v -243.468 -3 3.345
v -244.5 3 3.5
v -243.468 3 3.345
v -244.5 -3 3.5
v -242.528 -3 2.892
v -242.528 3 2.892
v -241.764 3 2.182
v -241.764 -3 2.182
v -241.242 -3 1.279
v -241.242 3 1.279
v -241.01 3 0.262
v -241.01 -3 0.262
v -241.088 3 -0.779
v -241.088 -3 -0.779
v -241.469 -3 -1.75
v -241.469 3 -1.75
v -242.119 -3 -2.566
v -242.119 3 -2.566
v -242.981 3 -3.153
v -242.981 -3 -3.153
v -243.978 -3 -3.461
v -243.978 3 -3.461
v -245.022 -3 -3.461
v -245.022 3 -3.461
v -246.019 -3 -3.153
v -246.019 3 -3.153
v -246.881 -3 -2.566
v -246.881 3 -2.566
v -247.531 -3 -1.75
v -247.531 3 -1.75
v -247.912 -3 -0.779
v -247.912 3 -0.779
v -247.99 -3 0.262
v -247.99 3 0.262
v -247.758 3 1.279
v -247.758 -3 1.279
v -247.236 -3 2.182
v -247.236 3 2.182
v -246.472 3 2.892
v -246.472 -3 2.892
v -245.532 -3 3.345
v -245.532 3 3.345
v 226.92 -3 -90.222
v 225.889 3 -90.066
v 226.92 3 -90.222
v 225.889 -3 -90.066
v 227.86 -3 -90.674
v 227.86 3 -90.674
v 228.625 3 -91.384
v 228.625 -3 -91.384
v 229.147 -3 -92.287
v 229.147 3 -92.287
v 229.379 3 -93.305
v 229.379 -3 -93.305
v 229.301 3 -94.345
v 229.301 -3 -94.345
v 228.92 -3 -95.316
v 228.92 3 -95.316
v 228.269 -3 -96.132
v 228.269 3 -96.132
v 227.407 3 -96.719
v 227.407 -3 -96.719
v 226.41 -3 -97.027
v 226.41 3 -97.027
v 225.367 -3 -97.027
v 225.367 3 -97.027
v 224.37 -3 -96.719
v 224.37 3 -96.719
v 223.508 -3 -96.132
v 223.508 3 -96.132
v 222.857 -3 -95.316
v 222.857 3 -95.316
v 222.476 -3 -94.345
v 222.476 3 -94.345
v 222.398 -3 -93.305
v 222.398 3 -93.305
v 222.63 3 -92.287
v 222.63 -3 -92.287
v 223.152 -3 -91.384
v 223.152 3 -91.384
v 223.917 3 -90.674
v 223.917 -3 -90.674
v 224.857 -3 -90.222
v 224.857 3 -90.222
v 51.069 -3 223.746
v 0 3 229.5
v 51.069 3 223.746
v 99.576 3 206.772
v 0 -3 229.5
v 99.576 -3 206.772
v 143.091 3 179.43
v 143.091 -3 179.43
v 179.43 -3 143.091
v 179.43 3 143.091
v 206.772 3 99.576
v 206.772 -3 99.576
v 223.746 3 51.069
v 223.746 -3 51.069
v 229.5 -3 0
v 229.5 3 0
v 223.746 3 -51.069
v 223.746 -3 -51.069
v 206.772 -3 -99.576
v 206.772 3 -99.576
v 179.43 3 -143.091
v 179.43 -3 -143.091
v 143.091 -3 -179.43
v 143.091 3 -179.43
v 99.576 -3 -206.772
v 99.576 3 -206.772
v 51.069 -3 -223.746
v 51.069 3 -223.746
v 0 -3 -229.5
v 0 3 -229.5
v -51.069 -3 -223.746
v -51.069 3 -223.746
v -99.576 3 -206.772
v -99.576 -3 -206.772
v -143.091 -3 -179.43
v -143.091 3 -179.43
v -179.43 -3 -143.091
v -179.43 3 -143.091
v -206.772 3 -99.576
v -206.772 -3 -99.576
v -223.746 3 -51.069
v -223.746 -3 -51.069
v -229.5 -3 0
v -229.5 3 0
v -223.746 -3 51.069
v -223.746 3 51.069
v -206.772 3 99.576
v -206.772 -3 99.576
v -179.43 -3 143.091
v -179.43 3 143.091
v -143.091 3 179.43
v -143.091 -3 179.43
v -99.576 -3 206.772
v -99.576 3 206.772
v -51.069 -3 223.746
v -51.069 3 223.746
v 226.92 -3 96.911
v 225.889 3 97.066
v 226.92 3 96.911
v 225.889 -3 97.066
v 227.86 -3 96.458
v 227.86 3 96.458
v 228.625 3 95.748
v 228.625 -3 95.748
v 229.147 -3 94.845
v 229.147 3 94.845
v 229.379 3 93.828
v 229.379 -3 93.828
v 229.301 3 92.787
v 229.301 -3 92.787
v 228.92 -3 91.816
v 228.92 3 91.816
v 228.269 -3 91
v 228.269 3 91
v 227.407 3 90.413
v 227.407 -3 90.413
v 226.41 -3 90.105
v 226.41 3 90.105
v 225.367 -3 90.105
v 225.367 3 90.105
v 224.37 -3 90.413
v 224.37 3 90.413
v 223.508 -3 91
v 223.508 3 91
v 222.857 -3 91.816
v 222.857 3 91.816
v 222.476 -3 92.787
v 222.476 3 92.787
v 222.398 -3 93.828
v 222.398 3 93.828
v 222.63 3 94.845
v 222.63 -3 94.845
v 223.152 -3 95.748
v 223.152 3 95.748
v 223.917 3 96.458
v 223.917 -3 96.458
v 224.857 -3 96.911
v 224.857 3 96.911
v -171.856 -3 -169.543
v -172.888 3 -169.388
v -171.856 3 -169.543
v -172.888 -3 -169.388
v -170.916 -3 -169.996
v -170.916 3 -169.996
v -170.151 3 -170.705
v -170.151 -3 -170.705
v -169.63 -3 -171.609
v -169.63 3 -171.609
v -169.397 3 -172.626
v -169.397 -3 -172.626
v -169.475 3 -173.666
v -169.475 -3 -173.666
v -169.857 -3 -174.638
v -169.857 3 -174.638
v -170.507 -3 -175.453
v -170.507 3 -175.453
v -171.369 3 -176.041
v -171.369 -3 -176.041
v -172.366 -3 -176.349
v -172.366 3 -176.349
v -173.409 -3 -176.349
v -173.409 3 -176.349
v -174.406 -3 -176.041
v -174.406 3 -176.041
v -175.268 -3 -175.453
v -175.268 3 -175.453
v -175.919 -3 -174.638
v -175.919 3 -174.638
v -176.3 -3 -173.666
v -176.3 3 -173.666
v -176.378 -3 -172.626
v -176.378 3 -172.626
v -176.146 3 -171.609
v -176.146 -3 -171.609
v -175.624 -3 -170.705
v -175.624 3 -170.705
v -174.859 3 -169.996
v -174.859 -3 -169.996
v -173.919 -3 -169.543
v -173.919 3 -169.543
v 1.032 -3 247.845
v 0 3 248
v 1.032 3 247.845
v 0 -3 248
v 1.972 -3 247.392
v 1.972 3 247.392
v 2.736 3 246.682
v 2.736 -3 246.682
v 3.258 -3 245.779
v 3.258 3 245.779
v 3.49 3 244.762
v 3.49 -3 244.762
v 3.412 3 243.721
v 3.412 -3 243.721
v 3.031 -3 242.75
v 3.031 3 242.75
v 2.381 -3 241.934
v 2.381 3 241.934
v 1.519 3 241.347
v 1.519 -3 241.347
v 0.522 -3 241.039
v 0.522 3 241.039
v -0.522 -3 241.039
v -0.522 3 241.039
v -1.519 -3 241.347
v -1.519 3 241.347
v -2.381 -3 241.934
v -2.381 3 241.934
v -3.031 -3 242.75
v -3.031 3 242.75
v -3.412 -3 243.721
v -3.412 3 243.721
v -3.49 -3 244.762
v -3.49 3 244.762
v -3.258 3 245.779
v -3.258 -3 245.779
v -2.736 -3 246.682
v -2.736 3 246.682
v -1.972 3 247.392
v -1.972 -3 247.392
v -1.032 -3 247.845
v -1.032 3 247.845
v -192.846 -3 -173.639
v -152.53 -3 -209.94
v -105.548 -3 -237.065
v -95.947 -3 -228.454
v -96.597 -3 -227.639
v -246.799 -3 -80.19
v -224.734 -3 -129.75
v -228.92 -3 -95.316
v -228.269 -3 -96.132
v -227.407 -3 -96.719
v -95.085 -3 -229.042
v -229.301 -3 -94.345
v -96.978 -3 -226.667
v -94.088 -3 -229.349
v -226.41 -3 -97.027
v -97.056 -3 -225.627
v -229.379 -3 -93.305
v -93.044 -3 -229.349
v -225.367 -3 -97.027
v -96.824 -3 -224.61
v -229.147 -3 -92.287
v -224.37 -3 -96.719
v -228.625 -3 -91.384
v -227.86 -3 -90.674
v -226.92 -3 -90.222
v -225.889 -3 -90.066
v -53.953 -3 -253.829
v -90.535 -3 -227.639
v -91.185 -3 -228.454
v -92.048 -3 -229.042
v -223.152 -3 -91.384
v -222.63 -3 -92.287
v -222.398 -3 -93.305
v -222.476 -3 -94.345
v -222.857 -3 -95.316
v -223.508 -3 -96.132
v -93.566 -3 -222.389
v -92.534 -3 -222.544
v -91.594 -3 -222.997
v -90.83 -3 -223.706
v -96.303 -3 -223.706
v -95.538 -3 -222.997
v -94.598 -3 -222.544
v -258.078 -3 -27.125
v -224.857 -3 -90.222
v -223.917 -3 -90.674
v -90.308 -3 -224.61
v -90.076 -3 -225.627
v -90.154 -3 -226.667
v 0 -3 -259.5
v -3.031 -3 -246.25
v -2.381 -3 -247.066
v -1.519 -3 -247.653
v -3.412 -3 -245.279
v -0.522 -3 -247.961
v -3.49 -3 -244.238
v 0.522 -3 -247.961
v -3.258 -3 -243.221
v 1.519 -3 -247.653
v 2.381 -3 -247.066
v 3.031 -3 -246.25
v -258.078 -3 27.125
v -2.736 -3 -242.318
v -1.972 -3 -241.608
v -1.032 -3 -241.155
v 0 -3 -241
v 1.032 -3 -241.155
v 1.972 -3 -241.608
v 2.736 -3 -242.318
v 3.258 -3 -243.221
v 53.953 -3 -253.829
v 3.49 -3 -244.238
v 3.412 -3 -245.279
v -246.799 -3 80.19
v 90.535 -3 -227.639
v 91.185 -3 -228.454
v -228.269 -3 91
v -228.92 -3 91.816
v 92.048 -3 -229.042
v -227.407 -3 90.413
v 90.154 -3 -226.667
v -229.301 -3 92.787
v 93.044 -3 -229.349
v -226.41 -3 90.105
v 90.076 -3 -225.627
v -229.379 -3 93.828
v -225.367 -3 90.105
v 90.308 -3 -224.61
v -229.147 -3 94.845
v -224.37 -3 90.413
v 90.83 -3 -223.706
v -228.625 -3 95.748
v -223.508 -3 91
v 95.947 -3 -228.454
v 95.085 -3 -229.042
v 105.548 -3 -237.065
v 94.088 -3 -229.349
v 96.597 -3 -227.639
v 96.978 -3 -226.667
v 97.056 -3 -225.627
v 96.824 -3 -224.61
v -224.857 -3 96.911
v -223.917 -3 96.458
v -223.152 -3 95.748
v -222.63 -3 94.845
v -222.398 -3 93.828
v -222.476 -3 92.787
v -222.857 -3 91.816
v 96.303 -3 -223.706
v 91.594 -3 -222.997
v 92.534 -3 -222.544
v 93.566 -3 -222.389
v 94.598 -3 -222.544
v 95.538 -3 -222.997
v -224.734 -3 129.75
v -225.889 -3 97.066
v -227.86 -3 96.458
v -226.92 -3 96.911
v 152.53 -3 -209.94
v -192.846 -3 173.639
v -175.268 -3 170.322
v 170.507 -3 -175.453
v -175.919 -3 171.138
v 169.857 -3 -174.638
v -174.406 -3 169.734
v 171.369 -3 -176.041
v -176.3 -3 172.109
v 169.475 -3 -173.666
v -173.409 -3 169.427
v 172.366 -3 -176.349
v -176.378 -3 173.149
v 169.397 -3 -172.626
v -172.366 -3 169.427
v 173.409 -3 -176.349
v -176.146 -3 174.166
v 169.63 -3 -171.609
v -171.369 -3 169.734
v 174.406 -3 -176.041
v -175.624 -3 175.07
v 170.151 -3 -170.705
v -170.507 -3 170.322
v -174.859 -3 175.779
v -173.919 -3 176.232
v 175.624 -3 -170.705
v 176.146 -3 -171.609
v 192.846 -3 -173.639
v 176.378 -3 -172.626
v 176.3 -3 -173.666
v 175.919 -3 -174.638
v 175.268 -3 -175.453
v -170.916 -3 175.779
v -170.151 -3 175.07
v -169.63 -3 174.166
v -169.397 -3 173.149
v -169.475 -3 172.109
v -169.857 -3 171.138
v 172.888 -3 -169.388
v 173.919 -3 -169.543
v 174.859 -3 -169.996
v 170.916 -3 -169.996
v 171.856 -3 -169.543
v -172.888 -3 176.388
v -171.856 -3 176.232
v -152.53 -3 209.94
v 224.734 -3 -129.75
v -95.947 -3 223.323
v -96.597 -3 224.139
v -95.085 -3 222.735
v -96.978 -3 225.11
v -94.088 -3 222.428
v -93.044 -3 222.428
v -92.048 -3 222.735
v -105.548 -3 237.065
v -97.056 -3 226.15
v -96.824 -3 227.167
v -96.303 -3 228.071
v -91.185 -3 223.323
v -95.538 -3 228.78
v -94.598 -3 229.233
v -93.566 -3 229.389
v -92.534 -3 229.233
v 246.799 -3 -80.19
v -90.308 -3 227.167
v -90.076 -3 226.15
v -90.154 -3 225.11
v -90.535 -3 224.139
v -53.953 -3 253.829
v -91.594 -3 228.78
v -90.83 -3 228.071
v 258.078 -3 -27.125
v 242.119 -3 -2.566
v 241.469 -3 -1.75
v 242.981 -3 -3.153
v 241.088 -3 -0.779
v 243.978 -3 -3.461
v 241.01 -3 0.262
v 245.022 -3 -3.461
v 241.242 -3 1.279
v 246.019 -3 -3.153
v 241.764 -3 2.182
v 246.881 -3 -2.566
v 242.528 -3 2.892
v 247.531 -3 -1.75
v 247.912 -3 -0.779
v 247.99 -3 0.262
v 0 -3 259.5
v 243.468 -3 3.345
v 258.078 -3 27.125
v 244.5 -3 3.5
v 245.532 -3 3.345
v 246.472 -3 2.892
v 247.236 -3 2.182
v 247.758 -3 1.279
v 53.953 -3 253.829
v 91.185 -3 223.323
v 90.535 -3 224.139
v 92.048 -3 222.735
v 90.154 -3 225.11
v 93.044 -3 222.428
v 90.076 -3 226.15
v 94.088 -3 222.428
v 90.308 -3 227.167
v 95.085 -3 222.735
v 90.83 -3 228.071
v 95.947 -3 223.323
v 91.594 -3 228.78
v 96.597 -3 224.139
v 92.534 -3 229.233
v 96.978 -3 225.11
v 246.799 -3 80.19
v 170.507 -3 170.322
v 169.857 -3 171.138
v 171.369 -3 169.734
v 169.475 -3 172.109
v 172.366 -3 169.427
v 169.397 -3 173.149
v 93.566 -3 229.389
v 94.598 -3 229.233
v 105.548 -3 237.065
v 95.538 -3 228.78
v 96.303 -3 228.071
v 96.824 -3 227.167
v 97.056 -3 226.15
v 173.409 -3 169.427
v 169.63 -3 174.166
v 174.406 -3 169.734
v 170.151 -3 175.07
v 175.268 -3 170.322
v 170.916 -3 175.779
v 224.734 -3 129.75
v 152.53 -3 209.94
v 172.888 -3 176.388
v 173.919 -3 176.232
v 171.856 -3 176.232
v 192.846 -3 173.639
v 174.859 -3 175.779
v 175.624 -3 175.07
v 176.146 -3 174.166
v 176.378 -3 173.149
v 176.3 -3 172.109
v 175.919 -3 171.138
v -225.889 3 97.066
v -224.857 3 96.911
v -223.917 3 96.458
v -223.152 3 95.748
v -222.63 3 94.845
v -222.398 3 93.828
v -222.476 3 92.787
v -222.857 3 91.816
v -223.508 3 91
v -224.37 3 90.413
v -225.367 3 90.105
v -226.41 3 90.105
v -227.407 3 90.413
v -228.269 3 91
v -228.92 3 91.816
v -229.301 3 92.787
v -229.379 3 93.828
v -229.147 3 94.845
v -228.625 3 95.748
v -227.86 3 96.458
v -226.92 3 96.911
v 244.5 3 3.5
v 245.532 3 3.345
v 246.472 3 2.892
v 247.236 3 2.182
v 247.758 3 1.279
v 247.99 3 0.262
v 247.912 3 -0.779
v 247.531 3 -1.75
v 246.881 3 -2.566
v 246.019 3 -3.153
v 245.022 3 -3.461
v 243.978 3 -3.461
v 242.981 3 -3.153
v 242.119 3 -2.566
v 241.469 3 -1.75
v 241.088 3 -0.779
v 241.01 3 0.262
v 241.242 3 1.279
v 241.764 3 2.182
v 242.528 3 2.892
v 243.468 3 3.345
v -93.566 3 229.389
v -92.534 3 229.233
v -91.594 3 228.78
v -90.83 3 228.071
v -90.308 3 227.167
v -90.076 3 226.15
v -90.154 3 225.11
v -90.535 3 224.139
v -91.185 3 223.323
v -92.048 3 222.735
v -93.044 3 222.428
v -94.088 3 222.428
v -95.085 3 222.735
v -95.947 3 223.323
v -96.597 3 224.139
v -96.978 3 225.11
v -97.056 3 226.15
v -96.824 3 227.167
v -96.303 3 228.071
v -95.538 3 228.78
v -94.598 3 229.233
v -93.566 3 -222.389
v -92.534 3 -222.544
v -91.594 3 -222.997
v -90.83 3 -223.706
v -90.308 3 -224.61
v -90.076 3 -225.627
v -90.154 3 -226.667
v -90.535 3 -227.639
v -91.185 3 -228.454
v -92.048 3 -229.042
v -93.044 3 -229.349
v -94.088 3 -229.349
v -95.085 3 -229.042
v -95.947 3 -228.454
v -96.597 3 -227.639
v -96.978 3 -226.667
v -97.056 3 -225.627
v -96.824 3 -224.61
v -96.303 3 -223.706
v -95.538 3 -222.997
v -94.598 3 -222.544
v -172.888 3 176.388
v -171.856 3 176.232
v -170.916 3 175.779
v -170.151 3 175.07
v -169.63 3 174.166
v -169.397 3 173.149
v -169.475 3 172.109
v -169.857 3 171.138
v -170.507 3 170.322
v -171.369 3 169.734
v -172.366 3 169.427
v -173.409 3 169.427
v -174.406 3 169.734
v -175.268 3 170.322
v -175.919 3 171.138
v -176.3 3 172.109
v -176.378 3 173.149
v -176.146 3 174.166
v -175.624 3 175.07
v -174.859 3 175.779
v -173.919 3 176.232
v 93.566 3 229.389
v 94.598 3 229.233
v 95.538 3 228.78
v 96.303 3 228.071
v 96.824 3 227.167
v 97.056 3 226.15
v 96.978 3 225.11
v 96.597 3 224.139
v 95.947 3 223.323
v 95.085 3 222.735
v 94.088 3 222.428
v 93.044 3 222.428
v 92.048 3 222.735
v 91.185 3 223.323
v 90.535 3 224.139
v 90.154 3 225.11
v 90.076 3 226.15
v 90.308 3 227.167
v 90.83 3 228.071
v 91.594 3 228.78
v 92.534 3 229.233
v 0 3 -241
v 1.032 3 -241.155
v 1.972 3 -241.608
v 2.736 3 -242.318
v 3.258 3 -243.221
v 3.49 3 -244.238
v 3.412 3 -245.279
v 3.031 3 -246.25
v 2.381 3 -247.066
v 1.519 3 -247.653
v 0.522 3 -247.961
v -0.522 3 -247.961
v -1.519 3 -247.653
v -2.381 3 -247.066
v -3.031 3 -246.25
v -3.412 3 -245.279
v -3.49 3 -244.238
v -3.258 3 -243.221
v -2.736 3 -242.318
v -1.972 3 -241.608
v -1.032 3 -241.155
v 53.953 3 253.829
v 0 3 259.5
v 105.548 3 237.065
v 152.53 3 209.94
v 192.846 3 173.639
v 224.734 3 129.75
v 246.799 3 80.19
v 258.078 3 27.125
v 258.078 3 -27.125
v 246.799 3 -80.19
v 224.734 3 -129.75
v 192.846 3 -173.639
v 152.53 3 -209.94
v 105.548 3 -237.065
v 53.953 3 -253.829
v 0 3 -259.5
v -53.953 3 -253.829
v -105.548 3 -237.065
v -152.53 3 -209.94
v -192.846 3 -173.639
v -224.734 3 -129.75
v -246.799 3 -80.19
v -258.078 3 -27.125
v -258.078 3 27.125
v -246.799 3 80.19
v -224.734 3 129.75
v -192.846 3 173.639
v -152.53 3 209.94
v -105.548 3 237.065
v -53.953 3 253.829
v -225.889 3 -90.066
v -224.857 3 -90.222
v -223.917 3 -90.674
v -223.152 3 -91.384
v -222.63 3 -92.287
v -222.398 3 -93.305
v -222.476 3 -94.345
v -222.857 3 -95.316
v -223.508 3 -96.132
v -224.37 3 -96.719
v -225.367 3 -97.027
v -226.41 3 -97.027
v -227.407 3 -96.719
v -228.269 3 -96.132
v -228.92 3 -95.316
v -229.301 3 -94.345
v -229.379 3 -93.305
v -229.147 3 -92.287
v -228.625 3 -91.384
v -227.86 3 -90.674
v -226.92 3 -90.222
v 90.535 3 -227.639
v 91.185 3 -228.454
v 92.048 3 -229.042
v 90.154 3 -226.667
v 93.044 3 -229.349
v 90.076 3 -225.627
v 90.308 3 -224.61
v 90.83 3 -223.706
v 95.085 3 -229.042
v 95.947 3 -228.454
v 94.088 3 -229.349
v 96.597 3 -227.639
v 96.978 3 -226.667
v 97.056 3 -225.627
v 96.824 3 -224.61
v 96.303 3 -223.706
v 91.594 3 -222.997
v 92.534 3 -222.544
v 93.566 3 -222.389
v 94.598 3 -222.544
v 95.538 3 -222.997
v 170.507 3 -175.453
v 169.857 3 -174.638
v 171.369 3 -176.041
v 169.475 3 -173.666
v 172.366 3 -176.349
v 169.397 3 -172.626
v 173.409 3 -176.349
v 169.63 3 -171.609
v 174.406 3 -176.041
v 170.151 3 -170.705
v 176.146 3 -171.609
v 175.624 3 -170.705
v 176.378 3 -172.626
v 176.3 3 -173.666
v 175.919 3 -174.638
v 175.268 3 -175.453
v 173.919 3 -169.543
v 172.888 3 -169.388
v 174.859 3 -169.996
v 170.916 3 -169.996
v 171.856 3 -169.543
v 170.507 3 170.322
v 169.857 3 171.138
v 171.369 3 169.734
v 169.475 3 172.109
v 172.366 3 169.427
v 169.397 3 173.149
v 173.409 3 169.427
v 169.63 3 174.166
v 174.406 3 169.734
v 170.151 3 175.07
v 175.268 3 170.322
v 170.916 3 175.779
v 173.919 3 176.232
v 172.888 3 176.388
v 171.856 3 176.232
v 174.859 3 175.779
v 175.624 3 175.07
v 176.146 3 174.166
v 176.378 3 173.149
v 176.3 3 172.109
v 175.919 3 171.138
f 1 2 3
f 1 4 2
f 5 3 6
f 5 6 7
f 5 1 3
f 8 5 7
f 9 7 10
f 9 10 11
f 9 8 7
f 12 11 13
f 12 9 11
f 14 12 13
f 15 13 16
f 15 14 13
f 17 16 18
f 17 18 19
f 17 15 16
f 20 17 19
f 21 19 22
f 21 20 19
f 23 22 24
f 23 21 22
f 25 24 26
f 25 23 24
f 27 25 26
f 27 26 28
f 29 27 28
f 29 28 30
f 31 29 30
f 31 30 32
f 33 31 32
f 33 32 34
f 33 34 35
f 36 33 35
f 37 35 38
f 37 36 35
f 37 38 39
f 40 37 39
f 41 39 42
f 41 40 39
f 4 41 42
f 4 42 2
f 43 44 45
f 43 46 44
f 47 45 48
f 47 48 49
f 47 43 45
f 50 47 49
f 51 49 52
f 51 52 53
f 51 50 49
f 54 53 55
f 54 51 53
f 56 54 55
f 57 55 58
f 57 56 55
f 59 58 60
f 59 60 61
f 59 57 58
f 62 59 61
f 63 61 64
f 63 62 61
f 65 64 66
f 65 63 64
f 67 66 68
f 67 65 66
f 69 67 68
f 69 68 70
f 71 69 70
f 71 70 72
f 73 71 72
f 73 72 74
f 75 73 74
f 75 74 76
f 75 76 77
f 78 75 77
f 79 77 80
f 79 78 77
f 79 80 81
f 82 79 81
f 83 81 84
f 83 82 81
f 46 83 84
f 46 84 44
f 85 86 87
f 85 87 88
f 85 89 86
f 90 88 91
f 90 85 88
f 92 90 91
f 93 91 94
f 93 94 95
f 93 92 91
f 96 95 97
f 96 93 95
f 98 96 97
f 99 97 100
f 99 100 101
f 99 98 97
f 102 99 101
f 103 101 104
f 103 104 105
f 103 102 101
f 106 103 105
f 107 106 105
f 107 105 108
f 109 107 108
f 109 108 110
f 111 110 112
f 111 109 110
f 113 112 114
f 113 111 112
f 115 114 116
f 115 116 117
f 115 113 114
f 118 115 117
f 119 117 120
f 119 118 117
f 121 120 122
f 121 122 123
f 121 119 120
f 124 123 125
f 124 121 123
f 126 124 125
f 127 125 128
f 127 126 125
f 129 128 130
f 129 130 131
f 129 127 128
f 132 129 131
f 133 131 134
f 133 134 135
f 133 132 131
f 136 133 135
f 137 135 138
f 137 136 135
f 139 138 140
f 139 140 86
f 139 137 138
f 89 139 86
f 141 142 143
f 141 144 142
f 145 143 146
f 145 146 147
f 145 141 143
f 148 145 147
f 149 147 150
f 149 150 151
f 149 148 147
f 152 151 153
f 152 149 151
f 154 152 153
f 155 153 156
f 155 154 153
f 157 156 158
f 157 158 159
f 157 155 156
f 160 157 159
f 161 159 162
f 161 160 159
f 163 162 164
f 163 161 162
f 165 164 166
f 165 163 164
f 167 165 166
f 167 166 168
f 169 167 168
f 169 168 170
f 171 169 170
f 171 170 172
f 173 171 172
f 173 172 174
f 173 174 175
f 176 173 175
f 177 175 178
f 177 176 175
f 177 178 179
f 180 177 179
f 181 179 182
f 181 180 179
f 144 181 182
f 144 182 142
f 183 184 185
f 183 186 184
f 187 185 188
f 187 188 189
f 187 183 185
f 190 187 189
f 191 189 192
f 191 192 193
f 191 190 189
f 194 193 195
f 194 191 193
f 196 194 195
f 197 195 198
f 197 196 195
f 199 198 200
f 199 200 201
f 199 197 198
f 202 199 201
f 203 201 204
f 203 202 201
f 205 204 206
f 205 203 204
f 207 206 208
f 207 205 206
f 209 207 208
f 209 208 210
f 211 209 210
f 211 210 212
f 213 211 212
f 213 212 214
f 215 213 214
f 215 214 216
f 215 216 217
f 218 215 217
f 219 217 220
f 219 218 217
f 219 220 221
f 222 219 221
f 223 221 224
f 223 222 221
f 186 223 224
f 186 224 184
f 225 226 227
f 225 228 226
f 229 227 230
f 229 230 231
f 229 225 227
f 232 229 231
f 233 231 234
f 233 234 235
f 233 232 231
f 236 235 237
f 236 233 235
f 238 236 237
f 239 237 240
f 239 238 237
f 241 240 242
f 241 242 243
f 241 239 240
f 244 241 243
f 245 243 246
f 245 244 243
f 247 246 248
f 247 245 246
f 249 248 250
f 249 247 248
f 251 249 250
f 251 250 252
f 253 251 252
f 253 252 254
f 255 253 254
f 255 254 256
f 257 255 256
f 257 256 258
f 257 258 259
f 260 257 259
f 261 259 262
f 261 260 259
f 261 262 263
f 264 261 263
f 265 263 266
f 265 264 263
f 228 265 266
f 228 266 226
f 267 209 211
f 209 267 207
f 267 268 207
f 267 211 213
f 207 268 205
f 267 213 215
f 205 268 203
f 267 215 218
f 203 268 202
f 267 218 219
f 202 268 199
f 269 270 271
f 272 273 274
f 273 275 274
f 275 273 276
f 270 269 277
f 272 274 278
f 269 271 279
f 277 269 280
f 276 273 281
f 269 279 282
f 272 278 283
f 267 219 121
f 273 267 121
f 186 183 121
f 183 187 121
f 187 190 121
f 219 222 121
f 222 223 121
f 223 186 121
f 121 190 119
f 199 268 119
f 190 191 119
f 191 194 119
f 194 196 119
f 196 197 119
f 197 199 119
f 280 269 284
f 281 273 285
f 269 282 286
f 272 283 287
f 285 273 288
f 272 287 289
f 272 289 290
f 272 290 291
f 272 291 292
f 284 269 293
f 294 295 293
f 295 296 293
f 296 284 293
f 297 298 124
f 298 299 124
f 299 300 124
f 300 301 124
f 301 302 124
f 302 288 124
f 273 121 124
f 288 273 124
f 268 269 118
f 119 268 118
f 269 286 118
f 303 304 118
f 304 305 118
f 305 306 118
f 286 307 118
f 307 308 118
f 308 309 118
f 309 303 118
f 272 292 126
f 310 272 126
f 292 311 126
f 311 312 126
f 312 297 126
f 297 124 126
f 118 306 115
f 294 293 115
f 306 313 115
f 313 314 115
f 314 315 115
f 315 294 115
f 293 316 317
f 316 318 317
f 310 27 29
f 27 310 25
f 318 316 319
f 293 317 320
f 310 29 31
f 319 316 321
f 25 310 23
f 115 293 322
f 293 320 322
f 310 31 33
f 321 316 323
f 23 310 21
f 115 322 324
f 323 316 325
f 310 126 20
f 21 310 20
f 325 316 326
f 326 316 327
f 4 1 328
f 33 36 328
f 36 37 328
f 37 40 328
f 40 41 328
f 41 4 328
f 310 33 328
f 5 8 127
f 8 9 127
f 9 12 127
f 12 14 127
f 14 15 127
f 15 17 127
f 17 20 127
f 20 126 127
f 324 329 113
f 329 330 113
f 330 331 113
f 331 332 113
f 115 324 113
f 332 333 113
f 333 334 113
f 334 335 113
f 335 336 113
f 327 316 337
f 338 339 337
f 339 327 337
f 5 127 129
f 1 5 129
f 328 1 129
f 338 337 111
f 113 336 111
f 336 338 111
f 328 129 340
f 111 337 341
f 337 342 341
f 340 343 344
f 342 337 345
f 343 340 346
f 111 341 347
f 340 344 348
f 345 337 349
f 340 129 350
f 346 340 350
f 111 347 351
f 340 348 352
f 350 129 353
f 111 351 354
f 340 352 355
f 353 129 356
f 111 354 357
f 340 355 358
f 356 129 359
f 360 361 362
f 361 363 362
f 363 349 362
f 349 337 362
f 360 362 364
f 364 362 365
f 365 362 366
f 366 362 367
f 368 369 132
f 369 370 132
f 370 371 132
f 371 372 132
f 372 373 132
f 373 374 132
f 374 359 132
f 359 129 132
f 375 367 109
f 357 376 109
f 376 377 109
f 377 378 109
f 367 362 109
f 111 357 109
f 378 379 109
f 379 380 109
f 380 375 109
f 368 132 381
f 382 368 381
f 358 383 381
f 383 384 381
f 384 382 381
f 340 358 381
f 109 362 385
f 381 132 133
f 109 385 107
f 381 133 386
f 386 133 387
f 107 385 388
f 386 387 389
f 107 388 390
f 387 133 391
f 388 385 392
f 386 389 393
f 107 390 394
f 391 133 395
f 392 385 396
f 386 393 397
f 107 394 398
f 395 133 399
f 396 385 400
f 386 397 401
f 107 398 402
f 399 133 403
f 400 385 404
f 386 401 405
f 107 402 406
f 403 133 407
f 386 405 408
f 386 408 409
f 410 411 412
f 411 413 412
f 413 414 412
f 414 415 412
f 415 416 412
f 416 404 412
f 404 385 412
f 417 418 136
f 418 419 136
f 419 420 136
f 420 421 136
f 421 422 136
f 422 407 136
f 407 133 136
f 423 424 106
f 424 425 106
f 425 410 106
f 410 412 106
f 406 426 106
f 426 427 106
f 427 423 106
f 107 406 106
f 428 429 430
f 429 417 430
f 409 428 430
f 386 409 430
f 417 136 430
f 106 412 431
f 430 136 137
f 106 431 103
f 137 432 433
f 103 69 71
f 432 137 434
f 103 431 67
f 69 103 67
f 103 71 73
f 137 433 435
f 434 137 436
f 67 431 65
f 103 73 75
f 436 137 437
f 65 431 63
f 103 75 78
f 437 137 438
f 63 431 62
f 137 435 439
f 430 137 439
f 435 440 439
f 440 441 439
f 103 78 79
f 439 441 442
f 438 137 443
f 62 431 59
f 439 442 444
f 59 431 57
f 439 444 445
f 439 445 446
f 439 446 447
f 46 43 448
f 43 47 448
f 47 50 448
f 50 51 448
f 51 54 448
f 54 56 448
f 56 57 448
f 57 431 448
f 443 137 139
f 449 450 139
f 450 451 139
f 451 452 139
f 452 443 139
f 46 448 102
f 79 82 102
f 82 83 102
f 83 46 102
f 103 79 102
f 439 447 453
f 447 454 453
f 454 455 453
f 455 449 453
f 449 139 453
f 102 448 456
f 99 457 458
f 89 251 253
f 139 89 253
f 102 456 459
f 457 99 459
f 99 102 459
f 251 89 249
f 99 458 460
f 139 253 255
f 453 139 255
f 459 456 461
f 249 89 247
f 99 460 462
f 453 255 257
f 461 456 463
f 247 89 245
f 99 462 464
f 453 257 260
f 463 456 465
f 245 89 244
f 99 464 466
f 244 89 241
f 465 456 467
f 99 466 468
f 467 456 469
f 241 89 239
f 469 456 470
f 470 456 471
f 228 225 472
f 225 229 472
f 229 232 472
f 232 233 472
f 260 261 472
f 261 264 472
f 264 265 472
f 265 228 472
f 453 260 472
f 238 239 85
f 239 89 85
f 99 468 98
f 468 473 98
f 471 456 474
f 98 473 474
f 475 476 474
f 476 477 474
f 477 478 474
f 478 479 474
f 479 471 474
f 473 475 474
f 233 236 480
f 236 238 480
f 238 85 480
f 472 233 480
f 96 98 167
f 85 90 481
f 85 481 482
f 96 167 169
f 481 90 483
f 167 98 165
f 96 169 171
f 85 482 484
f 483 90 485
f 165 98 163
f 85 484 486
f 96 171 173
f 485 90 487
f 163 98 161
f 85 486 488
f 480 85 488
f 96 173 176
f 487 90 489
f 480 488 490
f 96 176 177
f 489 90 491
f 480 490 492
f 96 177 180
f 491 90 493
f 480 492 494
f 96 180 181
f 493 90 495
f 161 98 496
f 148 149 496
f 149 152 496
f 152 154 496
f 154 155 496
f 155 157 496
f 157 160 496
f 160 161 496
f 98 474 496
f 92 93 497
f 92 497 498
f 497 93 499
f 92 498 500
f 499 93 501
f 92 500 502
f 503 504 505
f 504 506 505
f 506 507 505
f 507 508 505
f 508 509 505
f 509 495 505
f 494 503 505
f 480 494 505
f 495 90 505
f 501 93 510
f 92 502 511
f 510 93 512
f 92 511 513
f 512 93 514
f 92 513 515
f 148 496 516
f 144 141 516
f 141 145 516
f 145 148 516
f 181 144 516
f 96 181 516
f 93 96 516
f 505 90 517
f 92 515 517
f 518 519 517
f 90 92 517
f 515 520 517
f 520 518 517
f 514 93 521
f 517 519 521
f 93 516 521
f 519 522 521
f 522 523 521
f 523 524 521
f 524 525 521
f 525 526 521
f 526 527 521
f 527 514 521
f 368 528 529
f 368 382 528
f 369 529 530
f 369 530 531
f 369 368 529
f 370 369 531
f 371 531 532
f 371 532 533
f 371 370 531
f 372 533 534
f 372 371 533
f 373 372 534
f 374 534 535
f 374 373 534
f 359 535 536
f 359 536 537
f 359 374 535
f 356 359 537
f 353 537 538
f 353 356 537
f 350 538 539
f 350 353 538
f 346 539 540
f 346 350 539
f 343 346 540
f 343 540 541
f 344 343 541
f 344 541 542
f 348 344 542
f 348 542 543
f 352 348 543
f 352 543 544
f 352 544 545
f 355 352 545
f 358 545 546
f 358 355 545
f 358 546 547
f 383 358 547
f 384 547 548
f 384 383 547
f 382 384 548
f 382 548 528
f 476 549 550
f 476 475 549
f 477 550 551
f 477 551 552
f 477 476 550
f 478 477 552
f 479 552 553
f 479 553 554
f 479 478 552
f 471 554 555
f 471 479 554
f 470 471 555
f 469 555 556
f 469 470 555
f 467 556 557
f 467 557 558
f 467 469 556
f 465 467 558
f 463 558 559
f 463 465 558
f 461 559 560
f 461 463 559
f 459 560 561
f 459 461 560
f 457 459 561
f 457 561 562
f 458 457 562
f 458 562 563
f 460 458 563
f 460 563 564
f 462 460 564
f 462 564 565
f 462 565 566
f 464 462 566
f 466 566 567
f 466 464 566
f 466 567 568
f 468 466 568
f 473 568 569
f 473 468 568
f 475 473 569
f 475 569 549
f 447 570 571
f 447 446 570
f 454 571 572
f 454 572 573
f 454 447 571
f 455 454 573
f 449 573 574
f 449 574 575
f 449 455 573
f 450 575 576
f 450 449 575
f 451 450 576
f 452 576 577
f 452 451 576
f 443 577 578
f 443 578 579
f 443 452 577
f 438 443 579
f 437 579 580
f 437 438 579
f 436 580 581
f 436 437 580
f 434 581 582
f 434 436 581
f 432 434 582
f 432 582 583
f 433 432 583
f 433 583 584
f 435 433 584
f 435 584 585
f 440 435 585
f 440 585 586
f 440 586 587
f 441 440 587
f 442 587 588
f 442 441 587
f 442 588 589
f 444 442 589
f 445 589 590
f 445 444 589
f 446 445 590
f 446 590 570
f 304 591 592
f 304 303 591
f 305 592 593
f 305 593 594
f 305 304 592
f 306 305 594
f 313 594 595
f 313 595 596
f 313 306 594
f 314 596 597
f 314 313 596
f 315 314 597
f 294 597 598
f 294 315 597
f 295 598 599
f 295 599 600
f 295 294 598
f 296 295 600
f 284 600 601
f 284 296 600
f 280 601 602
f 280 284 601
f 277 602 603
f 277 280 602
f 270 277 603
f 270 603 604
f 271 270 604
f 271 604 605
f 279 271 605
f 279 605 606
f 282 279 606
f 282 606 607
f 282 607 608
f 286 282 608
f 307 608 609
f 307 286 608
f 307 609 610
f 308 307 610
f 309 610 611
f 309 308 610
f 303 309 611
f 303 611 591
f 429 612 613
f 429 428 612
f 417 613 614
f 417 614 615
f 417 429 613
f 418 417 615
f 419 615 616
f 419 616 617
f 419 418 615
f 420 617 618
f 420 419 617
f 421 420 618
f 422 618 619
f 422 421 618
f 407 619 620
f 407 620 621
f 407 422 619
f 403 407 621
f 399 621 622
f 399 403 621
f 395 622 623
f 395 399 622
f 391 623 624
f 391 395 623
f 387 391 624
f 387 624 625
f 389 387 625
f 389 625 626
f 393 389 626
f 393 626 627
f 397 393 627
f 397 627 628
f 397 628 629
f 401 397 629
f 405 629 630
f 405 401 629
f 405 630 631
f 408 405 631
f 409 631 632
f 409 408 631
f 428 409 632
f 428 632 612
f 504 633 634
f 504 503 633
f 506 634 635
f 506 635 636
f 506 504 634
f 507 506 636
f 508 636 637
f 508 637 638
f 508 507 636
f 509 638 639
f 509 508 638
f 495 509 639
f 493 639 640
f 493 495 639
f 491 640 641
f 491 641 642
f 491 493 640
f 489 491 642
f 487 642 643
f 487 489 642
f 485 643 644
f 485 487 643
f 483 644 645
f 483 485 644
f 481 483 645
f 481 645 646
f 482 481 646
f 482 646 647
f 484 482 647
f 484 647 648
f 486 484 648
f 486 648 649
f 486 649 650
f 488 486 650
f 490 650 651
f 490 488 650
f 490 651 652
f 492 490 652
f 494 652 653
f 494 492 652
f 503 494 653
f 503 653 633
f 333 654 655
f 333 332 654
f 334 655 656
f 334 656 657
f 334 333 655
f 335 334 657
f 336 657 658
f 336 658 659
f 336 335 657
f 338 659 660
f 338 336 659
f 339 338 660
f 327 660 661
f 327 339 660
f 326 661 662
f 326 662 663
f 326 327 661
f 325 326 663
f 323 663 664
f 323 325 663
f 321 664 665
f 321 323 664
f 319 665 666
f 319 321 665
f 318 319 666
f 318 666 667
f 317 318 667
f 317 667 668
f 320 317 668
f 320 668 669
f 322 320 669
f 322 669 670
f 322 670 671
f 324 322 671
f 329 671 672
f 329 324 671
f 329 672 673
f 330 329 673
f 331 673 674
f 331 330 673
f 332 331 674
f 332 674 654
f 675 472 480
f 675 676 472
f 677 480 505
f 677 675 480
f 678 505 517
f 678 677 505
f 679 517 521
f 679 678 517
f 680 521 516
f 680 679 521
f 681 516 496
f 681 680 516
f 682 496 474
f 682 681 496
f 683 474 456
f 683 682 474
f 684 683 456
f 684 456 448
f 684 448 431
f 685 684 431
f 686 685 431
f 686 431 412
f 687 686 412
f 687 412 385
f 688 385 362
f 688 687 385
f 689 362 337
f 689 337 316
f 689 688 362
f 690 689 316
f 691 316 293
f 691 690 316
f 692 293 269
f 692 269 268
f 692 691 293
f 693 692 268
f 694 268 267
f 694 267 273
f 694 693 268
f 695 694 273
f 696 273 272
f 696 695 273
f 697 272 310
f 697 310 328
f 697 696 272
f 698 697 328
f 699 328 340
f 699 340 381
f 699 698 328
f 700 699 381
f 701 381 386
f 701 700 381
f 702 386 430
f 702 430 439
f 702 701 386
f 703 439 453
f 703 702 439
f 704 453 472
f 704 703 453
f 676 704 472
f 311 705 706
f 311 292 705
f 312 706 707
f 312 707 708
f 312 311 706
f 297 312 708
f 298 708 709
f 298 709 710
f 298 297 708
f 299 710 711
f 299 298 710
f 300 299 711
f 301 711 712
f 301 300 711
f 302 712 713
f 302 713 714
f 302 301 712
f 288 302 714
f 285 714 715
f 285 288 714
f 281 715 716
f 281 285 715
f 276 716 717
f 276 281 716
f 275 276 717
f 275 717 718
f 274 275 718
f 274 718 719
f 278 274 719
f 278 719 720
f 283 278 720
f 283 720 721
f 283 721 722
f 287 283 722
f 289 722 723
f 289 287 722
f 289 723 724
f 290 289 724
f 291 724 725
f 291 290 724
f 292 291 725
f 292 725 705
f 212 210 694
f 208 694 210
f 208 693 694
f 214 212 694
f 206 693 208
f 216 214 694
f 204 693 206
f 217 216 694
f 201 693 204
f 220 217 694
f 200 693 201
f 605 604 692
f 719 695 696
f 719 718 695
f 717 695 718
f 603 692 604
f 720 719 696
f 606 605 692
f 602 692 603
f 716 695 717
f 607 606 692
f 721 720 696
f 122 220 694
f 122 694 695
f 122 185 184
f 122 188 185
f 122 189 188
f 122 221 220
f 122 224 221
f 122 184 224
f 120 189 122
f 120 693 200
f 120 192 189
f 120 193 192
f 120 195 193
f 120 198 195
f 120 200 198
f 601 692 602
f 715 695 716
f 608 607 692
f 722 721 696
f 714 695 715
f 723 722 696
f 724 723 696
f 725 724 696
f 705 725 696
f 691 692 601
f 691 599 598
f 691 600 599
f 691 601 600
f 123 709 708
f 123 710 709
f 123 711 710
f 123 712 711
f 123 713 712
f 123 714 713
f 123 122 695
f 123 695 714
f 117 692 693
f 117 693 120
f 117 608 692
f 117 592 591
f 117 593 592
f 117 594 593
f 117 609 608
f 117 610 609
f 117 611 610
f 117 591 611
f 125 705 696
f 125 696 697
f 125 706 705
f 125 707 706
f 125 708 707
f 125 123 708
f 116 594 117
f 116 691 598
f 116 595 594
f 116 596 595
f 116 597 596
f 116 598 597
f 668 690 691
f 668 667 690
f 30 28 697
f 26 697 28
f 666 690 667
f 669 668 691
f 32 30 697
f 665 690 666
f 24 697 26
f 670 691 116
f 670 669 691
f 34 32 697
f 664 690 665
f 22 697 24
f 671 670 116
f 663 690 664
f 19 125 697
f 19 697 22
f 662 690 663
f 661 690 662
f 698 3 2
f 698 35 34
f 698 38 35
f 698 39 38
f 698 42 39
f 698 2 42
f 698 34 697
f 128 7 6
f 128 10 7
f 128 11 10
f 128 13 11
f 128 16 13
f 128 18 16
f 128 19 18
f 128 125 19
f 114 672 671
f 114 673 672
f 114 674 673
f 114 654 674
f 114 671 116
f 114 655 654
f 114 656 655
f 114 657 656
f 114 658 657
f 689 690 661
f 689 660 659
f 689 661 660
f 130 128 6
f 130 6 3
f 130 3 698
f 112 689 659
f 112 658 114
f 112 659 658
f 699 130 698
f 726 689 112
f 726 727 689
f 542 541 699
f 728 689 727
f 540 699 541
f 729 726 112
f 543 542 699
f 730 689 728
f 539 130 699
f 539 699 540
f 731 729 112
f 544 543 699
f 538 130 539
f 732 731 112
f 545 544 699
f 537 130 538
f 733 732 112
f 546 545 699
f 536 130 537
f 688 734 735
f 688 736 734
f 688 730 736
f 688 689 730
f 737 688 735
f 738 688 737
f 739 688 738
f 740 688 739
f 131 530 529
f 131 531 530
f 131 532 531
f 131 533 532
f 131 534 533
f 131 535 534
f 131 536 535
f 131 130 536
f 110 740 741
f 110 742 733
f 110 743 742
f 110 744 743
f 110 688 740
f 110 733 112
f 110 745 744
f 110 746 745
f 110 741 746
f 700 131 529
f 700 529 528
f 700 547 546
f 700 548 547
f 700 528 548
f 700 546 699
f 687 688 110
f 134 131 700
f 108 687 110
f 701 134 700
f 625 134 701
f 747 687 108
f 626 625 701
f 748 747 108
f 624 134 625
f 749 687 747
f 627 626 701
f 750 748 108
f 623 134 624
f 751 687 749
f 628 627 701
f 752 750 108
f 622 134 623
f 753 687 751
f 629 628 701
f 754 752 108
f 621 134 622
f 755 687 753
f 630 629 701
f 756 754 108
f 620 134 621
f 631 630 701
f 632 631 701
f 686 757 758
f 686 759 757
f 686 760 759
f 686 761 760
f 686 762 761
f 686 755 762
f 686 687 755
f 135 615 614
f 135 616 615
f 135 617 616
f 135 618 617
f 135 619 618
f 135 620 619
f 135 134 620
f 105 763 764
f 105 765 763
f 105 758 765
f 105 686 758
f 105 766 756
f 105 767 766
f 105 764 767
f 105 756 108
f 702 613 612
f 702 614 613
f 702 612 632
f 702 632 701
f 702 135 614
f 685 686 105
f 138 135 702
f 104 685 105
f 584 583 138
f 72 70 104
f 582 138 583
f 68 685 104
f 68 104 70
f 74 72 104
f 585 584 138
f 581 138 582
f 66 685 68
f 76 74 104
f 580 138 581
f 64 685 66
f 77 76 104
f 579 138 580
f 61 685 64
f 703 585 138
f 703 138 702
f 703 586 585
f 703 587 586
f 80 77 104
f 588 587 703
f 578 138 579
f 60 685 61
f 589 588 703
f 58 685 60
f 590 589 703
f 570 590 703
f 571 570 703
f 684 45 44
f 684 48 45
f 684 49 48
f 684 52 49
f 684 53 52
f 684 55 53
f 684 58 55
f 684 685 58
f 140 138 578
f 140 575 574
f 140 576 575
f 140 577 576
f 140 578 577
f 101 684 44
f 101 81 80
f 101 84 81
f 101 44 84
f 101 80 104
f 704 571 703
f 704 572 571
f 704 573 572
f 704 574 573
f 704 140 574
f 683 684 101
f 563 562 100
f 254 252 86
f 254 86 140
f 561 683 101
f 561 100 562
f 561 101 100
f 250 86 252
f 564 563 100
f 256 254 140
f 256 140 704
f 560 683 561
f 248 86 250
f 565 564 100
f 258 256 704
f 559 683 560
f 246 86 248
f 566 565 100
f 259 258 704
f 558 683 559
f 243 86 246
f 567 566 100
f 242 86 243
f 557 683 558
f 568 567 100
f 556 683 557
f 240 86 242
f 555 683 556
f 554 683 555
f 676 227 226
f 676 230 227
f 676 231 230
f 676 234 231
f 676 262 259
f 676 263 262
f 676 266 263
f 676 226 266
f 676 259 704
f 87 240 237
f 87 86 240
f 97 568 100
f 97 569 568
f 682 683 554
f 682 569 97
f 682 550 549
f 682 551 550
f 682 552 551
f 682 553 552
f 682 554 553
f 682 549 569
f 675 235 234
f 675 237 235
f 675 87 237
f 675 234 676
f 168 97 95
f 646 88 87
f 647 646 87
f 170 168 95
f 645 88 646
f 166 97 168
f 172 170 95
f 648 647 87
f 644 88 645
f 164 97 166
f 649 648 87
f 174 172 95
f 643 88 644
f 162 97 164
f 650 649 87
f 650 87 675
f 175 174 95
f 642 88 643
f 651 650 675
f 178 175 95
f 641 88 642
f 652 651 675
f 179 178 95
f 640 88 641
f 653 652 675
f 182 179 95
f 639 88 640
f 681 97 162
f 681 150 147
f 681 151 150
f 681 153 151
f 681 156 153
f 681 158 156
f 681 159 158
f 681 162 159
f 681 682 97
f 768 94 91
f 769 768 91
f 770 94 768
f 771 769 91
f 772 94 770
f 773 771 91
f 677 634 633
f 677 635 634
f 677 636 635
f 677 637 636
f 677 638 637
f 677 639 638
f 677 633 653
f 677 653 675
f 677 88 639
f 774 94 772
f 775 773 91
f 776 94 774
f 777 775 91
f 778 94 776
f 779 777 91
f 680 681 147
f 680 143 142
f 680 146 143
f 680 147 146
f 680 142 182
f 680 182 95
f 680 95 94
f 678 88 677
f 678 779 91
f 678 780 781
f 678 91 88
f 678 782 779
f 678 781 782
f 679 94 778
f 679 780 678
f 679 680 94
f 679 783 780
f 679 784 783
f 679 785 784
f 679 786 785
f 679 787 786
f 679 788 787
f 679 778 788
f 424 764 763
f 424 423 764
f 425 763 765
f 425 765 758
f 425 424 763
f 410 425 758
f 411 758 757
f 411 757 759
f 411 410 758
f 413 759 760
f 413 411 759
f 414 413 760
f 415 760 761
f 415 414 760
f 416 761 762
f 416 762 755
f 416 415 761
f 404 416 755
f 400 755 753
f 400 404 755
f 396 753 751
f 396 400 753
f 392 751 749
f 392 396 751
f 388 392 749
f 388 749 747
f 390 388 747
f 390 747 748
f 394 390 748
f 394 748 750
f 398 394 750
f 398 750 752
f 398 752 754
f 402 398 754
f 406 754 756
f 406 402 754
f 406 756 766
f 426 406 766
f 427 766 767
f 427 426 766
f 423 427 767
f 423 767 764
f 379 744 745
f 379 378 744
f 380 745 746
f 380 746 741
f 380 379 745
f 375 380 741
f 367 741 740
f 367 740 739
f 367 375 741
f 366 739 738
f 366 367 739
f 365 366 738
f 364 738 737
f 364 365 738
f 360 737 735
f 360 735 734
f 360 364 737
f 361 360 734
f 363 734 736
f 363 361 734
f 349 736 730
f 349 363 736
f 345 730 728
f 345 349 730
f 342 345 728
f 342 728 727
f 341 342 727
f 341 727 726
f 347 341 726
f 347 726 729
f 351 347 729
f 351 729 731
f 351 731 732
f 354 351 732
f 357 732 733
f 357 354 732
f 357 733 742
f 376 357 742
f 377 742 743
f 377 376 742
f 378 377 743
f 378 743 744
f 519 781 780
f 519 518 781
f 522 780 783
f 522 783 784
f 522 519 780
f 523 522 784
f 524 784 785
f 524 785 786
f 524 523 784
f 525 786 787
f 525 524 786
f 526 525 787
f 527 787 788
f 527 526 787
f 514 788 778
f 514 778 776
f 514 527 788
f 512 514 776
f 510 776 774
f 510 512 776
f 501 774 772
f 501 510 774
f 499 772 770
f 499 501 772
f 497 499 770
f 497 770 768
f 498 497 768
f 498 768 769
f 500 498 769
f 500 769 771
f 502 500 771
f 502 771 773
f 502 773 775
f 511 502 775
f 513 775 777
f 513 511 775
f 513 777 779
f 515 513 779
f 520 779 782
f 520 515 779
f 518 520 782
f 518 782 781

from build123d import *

# Parameters (mm, degrees)
SCHIZZO1_R                   = 259.5
SCHIZZO1_R_2                 = 229.5
SCHIZZO1_R_3                 = 3.5
ESTRUSIONE_ESTRUSIONE1_DEPTH = 3


with BuildPart() as part:
    # Schizzo1 → Estrusione-Estrusione1 (new, symmetric)
    with BuildSketch(Plane(origin=(0, 0, 0), x_dir=(1, 0, 0), z_dir=(0, 1, 0))):
        Circle(SCHIZZO1_R)
        Circle(SCHIZZO1_R_2, mode=Mode.SUBTRACT)
        with Locations((0, 244.5)):
            Circle(SCHIZZO1_R_3, mode=Mode.SUBTRACT)
        with Locations((93.566099213, 225.888545699)):
            Circle(SCHIZZO1_R_3, mode=Mode.SUBTRACT)
        with Locations((172.887608, 172.887608)):
            Circle(SCHIZZO1_R_3, mode=Mode.SUBTRACT)
        with Locations((225.888545699, 93.566099213)):
            Circle(SCHIZZO1_R_3, mode=Mode.SUBTRACT)
        with Locations((244.5, 0)):
            Circle(SCHIZZO1_R_3, mode=Mode.SUBTRACT)
        with Locations((225.888545699, -93.566099213)):
            Circle(SCHIZZO1_R_3, mode=Mode.SUBTRACT)
        with Locations((172.887608, -172.887608)):
            Circle(SCHIZZO1_R_3, mode=Mode.SUBTRACT)
        with Locations((93.566099213, -225.888545699)):
            Circle(SCHIZZO1_R_3, mode=Mode.SUBTRACT)
        with Locations((0, -244.5)):
            Circle(SCHIZZO1_R_3, mode=Mode.SUBTRACT)
        with Locations((-93.566099213, -225.888545699)):
            Circle(SCHIZZO1_R_3, mode=Mode.SUBTRACT)
        with Locations((-172.887608, -172.887608)):
            Circle(SCHIZZO1_R_3, mode=Mode.SUBTRACT)
        with Locations((-225.888545699, -93.566099213)):
            Circle(SCHIZZO1_R_3, mode=Mode.SUBTRACT)
        with Locations((-244.5, 0)):
            Circle(SCHIZZO1_R_3, mode=Mode.SUBTRACT)
        with Locations((-225.888545699, 93.566099213)):
            Circle(SCHIZZO1_R_3, mode=Mode.SUBTRACT)
        with Locations((-172.887608, 172.887608)):
            Circle(SCHIZZO1_R_3, mode=Mode.SUBTRACT)
        with Locations((-93.566099213, 225.888545699)):
            Circle(SCHIZZO1_R_3, mode=Mode.SUBTRACT)
    extrude(amount=ESTRUSIONE_ESTRUSIONE1_DEPTH, both=True)


solid = part.part
